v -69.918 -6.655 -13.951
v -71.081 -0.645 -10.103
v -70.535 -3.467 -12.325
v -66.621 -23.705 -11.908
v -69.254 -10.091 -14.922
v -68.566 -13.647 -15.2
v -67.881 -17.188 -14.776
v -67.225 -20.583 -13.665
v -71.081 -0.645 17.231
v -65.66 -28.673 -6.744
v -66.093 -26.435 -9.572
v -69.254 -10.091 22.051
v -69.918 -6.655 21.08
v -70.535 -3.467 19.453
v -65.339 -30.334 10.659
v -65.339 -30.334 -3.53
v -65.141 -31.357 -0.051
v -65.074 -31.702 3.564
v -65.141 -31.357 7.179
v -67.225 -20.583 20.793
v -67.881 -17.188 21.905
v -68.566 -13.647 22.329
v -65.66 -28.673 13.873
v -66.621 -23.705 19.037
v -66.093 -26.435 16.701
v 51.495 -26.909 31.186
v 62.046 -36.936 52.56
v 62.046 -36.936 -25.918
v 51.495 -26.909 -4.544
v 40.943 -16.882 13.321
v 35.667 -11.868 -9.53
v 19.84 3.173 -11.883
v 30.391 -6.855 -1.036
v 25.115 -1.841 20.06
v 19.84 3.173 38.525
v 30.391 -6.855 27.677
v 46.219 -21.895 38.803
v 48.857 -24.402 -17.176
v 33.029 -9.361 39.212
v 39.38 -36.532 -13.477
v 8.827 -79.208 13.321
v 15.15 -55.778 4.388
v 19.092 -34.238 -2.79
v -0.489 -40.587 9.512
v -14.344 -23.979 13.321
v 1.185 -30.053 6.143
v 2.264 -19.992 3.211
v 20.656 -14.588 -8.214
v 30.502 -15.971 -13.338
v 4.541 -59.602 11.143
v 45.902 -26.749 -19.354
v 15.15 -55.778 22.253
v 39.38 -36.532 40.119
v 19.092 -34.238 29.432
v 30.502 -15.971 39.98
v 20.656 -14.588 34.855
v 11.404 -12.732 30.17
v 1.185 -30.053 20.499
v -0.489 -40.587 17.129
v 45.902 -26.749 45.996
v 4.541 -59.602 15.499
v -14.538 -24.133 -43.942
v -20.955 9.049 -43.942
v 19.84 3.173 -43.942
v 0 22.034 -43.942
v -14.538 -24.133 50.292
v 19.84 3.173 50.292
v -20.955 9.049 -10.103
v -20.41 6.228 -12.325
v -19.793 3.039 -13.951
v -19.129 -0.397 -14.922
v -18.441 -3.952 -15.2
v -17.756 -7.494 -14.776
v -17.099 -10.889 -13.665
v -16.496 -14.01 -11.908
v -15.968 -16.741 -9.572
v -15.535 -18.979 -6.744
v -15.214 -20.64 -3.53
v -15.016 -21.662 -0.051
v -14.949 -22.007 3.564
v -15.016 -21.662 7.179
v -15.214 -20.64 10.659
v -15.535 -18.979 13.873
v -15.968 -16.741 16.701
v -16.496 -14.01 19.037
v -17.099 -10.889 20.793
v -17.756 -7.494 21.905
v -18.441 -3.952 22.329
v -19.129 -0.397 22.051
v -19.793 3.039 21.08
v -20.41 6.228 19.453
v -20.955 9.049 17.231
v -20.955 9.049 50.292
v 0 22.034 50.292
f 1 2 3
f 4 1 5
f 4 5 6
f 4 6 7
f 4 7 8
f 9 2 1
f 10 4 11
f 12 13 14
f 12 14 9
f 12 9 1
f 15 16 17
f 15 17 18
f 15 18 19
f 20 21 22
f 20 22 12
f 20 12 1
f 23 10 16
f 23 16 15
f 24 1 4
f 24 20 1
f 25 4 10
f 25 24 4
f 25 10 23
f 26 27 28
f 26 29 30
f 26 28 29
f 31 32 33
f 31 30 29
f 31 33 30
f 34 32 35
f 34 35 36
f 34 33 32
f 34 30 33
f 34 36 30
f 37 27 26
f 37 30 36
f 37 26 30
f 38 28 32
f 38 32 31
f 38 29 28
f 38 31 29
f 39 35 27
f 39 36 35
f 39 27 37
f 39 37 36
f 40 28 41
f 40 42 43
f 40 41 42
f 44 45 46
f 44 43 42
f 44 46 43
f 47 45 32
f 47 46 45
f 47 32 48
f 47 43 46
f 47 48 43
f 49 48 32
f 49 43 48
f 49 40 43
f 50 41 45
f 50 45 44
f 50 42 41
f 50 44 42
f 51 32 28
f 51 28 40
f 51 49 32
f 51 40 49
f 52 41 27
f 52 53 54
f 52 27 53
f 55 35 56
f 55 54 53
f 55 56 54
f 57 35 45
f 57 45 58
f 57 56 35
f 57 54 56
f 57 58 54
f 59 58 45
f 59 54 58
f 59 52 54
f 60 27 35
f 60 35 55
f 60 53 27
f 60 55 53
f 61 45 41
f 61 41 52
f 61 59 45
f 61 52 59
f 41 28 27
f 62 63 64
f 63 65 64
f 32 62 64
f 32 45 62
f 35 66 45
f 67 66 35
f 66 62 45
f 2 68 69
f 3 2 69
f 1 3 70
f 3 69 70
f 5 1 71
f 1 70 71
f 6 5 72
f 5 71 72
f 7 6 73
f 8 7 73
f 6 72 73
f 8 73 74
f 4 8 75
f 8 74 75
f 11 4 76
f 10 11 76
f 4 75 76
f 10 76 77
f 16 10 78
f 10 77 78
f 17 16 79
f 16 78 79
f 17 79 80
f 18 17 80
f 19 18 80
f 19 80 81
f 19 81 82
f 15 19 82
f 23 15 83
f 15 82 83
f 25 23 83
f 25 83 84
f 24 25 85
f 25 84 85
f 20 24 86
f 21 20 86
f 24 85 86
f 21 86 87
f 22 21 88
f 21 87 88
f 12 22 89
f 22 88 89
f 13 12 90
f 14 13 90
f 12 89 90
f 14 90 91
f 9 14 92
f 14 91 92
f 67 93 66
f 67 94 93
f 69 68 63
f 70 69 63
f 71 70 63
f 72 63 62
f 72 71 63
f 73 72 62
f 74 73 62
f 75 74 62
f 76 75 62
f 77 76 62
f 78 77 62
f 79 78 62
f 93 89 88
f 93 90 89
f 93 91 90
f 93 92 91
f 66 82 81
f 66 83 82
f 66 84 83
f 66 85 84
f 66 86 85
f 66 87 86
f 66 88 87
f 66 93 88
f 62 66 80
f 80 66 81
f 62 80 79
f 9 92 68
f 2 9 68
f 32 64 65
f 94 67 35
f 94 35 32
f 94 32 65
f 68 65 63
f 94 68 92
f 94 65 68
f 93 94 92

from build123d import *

# Parameters (mm, degrees)
F1_DEPTH      = 50.292
F1_DEPTH_BACK = 43.942
F3_DEPTH      = 51.054
F5_DEPTH      = 57.658
F5_TAPER      = -8


with BuildPart() as f1:
    # F0 (on Top) → F1 (new body, two sides)
    with BuildSketch(Plane.XY) as f1_sk:
        Polygon((-20.9554843605, 9.0488390997), (-14.5379882306, -24.1334326565), (19.8396630585, 3.1725820154), (0, 22.0344699919), align=None)
    extrude(amount=F1_DEPTH)
    extrude(f1_sk.sketch, amount=-F1_DEPTH_BACK)

    # F2 (on face) → F3 (join)
    with BuildSketch(Plane(origin=(-18.5129661664, -3.5804326358, 0), x_dir=(0.1898827546, -0.981806773, 0), z_dir=(-0.981806773, -0.1898827546, 0))):
        with BuildLine():
            ThreePointArc((-12.8632966108, -10.1028013332), (7.4441391901, -13.6647087453), (18.768443533, 3.5643151496))
            ThreePointArc((18.768443533, 3.5643151496), (7.4441391901, 20.7933390444), (-12.8632966108, 17.2314316323))
            Line((-12.8632966108, 17.2314316323), (-12.8632966108, -10.1028013332))
        make_face()
    extrude(amount=F3_DEPTH)

    # F4 (on face) → F5 (join)
    with BuildSketch(Plane(origin=(6.1297133792, -7.7171696999, 0), x_dir=(0.7830430091, 0.6219675601, 0), z_dir=(0.6219675601, -0.7830430091, 0))):
        Polygon((17.5085525567, -11.8831288274), (17.5085525567, 38.5248087551), (-26.1460019422, 13.3208399639), align=None)
    extrude(amount=F5_DEPTH, taper=F5_TAPER)


solid = f1.part
